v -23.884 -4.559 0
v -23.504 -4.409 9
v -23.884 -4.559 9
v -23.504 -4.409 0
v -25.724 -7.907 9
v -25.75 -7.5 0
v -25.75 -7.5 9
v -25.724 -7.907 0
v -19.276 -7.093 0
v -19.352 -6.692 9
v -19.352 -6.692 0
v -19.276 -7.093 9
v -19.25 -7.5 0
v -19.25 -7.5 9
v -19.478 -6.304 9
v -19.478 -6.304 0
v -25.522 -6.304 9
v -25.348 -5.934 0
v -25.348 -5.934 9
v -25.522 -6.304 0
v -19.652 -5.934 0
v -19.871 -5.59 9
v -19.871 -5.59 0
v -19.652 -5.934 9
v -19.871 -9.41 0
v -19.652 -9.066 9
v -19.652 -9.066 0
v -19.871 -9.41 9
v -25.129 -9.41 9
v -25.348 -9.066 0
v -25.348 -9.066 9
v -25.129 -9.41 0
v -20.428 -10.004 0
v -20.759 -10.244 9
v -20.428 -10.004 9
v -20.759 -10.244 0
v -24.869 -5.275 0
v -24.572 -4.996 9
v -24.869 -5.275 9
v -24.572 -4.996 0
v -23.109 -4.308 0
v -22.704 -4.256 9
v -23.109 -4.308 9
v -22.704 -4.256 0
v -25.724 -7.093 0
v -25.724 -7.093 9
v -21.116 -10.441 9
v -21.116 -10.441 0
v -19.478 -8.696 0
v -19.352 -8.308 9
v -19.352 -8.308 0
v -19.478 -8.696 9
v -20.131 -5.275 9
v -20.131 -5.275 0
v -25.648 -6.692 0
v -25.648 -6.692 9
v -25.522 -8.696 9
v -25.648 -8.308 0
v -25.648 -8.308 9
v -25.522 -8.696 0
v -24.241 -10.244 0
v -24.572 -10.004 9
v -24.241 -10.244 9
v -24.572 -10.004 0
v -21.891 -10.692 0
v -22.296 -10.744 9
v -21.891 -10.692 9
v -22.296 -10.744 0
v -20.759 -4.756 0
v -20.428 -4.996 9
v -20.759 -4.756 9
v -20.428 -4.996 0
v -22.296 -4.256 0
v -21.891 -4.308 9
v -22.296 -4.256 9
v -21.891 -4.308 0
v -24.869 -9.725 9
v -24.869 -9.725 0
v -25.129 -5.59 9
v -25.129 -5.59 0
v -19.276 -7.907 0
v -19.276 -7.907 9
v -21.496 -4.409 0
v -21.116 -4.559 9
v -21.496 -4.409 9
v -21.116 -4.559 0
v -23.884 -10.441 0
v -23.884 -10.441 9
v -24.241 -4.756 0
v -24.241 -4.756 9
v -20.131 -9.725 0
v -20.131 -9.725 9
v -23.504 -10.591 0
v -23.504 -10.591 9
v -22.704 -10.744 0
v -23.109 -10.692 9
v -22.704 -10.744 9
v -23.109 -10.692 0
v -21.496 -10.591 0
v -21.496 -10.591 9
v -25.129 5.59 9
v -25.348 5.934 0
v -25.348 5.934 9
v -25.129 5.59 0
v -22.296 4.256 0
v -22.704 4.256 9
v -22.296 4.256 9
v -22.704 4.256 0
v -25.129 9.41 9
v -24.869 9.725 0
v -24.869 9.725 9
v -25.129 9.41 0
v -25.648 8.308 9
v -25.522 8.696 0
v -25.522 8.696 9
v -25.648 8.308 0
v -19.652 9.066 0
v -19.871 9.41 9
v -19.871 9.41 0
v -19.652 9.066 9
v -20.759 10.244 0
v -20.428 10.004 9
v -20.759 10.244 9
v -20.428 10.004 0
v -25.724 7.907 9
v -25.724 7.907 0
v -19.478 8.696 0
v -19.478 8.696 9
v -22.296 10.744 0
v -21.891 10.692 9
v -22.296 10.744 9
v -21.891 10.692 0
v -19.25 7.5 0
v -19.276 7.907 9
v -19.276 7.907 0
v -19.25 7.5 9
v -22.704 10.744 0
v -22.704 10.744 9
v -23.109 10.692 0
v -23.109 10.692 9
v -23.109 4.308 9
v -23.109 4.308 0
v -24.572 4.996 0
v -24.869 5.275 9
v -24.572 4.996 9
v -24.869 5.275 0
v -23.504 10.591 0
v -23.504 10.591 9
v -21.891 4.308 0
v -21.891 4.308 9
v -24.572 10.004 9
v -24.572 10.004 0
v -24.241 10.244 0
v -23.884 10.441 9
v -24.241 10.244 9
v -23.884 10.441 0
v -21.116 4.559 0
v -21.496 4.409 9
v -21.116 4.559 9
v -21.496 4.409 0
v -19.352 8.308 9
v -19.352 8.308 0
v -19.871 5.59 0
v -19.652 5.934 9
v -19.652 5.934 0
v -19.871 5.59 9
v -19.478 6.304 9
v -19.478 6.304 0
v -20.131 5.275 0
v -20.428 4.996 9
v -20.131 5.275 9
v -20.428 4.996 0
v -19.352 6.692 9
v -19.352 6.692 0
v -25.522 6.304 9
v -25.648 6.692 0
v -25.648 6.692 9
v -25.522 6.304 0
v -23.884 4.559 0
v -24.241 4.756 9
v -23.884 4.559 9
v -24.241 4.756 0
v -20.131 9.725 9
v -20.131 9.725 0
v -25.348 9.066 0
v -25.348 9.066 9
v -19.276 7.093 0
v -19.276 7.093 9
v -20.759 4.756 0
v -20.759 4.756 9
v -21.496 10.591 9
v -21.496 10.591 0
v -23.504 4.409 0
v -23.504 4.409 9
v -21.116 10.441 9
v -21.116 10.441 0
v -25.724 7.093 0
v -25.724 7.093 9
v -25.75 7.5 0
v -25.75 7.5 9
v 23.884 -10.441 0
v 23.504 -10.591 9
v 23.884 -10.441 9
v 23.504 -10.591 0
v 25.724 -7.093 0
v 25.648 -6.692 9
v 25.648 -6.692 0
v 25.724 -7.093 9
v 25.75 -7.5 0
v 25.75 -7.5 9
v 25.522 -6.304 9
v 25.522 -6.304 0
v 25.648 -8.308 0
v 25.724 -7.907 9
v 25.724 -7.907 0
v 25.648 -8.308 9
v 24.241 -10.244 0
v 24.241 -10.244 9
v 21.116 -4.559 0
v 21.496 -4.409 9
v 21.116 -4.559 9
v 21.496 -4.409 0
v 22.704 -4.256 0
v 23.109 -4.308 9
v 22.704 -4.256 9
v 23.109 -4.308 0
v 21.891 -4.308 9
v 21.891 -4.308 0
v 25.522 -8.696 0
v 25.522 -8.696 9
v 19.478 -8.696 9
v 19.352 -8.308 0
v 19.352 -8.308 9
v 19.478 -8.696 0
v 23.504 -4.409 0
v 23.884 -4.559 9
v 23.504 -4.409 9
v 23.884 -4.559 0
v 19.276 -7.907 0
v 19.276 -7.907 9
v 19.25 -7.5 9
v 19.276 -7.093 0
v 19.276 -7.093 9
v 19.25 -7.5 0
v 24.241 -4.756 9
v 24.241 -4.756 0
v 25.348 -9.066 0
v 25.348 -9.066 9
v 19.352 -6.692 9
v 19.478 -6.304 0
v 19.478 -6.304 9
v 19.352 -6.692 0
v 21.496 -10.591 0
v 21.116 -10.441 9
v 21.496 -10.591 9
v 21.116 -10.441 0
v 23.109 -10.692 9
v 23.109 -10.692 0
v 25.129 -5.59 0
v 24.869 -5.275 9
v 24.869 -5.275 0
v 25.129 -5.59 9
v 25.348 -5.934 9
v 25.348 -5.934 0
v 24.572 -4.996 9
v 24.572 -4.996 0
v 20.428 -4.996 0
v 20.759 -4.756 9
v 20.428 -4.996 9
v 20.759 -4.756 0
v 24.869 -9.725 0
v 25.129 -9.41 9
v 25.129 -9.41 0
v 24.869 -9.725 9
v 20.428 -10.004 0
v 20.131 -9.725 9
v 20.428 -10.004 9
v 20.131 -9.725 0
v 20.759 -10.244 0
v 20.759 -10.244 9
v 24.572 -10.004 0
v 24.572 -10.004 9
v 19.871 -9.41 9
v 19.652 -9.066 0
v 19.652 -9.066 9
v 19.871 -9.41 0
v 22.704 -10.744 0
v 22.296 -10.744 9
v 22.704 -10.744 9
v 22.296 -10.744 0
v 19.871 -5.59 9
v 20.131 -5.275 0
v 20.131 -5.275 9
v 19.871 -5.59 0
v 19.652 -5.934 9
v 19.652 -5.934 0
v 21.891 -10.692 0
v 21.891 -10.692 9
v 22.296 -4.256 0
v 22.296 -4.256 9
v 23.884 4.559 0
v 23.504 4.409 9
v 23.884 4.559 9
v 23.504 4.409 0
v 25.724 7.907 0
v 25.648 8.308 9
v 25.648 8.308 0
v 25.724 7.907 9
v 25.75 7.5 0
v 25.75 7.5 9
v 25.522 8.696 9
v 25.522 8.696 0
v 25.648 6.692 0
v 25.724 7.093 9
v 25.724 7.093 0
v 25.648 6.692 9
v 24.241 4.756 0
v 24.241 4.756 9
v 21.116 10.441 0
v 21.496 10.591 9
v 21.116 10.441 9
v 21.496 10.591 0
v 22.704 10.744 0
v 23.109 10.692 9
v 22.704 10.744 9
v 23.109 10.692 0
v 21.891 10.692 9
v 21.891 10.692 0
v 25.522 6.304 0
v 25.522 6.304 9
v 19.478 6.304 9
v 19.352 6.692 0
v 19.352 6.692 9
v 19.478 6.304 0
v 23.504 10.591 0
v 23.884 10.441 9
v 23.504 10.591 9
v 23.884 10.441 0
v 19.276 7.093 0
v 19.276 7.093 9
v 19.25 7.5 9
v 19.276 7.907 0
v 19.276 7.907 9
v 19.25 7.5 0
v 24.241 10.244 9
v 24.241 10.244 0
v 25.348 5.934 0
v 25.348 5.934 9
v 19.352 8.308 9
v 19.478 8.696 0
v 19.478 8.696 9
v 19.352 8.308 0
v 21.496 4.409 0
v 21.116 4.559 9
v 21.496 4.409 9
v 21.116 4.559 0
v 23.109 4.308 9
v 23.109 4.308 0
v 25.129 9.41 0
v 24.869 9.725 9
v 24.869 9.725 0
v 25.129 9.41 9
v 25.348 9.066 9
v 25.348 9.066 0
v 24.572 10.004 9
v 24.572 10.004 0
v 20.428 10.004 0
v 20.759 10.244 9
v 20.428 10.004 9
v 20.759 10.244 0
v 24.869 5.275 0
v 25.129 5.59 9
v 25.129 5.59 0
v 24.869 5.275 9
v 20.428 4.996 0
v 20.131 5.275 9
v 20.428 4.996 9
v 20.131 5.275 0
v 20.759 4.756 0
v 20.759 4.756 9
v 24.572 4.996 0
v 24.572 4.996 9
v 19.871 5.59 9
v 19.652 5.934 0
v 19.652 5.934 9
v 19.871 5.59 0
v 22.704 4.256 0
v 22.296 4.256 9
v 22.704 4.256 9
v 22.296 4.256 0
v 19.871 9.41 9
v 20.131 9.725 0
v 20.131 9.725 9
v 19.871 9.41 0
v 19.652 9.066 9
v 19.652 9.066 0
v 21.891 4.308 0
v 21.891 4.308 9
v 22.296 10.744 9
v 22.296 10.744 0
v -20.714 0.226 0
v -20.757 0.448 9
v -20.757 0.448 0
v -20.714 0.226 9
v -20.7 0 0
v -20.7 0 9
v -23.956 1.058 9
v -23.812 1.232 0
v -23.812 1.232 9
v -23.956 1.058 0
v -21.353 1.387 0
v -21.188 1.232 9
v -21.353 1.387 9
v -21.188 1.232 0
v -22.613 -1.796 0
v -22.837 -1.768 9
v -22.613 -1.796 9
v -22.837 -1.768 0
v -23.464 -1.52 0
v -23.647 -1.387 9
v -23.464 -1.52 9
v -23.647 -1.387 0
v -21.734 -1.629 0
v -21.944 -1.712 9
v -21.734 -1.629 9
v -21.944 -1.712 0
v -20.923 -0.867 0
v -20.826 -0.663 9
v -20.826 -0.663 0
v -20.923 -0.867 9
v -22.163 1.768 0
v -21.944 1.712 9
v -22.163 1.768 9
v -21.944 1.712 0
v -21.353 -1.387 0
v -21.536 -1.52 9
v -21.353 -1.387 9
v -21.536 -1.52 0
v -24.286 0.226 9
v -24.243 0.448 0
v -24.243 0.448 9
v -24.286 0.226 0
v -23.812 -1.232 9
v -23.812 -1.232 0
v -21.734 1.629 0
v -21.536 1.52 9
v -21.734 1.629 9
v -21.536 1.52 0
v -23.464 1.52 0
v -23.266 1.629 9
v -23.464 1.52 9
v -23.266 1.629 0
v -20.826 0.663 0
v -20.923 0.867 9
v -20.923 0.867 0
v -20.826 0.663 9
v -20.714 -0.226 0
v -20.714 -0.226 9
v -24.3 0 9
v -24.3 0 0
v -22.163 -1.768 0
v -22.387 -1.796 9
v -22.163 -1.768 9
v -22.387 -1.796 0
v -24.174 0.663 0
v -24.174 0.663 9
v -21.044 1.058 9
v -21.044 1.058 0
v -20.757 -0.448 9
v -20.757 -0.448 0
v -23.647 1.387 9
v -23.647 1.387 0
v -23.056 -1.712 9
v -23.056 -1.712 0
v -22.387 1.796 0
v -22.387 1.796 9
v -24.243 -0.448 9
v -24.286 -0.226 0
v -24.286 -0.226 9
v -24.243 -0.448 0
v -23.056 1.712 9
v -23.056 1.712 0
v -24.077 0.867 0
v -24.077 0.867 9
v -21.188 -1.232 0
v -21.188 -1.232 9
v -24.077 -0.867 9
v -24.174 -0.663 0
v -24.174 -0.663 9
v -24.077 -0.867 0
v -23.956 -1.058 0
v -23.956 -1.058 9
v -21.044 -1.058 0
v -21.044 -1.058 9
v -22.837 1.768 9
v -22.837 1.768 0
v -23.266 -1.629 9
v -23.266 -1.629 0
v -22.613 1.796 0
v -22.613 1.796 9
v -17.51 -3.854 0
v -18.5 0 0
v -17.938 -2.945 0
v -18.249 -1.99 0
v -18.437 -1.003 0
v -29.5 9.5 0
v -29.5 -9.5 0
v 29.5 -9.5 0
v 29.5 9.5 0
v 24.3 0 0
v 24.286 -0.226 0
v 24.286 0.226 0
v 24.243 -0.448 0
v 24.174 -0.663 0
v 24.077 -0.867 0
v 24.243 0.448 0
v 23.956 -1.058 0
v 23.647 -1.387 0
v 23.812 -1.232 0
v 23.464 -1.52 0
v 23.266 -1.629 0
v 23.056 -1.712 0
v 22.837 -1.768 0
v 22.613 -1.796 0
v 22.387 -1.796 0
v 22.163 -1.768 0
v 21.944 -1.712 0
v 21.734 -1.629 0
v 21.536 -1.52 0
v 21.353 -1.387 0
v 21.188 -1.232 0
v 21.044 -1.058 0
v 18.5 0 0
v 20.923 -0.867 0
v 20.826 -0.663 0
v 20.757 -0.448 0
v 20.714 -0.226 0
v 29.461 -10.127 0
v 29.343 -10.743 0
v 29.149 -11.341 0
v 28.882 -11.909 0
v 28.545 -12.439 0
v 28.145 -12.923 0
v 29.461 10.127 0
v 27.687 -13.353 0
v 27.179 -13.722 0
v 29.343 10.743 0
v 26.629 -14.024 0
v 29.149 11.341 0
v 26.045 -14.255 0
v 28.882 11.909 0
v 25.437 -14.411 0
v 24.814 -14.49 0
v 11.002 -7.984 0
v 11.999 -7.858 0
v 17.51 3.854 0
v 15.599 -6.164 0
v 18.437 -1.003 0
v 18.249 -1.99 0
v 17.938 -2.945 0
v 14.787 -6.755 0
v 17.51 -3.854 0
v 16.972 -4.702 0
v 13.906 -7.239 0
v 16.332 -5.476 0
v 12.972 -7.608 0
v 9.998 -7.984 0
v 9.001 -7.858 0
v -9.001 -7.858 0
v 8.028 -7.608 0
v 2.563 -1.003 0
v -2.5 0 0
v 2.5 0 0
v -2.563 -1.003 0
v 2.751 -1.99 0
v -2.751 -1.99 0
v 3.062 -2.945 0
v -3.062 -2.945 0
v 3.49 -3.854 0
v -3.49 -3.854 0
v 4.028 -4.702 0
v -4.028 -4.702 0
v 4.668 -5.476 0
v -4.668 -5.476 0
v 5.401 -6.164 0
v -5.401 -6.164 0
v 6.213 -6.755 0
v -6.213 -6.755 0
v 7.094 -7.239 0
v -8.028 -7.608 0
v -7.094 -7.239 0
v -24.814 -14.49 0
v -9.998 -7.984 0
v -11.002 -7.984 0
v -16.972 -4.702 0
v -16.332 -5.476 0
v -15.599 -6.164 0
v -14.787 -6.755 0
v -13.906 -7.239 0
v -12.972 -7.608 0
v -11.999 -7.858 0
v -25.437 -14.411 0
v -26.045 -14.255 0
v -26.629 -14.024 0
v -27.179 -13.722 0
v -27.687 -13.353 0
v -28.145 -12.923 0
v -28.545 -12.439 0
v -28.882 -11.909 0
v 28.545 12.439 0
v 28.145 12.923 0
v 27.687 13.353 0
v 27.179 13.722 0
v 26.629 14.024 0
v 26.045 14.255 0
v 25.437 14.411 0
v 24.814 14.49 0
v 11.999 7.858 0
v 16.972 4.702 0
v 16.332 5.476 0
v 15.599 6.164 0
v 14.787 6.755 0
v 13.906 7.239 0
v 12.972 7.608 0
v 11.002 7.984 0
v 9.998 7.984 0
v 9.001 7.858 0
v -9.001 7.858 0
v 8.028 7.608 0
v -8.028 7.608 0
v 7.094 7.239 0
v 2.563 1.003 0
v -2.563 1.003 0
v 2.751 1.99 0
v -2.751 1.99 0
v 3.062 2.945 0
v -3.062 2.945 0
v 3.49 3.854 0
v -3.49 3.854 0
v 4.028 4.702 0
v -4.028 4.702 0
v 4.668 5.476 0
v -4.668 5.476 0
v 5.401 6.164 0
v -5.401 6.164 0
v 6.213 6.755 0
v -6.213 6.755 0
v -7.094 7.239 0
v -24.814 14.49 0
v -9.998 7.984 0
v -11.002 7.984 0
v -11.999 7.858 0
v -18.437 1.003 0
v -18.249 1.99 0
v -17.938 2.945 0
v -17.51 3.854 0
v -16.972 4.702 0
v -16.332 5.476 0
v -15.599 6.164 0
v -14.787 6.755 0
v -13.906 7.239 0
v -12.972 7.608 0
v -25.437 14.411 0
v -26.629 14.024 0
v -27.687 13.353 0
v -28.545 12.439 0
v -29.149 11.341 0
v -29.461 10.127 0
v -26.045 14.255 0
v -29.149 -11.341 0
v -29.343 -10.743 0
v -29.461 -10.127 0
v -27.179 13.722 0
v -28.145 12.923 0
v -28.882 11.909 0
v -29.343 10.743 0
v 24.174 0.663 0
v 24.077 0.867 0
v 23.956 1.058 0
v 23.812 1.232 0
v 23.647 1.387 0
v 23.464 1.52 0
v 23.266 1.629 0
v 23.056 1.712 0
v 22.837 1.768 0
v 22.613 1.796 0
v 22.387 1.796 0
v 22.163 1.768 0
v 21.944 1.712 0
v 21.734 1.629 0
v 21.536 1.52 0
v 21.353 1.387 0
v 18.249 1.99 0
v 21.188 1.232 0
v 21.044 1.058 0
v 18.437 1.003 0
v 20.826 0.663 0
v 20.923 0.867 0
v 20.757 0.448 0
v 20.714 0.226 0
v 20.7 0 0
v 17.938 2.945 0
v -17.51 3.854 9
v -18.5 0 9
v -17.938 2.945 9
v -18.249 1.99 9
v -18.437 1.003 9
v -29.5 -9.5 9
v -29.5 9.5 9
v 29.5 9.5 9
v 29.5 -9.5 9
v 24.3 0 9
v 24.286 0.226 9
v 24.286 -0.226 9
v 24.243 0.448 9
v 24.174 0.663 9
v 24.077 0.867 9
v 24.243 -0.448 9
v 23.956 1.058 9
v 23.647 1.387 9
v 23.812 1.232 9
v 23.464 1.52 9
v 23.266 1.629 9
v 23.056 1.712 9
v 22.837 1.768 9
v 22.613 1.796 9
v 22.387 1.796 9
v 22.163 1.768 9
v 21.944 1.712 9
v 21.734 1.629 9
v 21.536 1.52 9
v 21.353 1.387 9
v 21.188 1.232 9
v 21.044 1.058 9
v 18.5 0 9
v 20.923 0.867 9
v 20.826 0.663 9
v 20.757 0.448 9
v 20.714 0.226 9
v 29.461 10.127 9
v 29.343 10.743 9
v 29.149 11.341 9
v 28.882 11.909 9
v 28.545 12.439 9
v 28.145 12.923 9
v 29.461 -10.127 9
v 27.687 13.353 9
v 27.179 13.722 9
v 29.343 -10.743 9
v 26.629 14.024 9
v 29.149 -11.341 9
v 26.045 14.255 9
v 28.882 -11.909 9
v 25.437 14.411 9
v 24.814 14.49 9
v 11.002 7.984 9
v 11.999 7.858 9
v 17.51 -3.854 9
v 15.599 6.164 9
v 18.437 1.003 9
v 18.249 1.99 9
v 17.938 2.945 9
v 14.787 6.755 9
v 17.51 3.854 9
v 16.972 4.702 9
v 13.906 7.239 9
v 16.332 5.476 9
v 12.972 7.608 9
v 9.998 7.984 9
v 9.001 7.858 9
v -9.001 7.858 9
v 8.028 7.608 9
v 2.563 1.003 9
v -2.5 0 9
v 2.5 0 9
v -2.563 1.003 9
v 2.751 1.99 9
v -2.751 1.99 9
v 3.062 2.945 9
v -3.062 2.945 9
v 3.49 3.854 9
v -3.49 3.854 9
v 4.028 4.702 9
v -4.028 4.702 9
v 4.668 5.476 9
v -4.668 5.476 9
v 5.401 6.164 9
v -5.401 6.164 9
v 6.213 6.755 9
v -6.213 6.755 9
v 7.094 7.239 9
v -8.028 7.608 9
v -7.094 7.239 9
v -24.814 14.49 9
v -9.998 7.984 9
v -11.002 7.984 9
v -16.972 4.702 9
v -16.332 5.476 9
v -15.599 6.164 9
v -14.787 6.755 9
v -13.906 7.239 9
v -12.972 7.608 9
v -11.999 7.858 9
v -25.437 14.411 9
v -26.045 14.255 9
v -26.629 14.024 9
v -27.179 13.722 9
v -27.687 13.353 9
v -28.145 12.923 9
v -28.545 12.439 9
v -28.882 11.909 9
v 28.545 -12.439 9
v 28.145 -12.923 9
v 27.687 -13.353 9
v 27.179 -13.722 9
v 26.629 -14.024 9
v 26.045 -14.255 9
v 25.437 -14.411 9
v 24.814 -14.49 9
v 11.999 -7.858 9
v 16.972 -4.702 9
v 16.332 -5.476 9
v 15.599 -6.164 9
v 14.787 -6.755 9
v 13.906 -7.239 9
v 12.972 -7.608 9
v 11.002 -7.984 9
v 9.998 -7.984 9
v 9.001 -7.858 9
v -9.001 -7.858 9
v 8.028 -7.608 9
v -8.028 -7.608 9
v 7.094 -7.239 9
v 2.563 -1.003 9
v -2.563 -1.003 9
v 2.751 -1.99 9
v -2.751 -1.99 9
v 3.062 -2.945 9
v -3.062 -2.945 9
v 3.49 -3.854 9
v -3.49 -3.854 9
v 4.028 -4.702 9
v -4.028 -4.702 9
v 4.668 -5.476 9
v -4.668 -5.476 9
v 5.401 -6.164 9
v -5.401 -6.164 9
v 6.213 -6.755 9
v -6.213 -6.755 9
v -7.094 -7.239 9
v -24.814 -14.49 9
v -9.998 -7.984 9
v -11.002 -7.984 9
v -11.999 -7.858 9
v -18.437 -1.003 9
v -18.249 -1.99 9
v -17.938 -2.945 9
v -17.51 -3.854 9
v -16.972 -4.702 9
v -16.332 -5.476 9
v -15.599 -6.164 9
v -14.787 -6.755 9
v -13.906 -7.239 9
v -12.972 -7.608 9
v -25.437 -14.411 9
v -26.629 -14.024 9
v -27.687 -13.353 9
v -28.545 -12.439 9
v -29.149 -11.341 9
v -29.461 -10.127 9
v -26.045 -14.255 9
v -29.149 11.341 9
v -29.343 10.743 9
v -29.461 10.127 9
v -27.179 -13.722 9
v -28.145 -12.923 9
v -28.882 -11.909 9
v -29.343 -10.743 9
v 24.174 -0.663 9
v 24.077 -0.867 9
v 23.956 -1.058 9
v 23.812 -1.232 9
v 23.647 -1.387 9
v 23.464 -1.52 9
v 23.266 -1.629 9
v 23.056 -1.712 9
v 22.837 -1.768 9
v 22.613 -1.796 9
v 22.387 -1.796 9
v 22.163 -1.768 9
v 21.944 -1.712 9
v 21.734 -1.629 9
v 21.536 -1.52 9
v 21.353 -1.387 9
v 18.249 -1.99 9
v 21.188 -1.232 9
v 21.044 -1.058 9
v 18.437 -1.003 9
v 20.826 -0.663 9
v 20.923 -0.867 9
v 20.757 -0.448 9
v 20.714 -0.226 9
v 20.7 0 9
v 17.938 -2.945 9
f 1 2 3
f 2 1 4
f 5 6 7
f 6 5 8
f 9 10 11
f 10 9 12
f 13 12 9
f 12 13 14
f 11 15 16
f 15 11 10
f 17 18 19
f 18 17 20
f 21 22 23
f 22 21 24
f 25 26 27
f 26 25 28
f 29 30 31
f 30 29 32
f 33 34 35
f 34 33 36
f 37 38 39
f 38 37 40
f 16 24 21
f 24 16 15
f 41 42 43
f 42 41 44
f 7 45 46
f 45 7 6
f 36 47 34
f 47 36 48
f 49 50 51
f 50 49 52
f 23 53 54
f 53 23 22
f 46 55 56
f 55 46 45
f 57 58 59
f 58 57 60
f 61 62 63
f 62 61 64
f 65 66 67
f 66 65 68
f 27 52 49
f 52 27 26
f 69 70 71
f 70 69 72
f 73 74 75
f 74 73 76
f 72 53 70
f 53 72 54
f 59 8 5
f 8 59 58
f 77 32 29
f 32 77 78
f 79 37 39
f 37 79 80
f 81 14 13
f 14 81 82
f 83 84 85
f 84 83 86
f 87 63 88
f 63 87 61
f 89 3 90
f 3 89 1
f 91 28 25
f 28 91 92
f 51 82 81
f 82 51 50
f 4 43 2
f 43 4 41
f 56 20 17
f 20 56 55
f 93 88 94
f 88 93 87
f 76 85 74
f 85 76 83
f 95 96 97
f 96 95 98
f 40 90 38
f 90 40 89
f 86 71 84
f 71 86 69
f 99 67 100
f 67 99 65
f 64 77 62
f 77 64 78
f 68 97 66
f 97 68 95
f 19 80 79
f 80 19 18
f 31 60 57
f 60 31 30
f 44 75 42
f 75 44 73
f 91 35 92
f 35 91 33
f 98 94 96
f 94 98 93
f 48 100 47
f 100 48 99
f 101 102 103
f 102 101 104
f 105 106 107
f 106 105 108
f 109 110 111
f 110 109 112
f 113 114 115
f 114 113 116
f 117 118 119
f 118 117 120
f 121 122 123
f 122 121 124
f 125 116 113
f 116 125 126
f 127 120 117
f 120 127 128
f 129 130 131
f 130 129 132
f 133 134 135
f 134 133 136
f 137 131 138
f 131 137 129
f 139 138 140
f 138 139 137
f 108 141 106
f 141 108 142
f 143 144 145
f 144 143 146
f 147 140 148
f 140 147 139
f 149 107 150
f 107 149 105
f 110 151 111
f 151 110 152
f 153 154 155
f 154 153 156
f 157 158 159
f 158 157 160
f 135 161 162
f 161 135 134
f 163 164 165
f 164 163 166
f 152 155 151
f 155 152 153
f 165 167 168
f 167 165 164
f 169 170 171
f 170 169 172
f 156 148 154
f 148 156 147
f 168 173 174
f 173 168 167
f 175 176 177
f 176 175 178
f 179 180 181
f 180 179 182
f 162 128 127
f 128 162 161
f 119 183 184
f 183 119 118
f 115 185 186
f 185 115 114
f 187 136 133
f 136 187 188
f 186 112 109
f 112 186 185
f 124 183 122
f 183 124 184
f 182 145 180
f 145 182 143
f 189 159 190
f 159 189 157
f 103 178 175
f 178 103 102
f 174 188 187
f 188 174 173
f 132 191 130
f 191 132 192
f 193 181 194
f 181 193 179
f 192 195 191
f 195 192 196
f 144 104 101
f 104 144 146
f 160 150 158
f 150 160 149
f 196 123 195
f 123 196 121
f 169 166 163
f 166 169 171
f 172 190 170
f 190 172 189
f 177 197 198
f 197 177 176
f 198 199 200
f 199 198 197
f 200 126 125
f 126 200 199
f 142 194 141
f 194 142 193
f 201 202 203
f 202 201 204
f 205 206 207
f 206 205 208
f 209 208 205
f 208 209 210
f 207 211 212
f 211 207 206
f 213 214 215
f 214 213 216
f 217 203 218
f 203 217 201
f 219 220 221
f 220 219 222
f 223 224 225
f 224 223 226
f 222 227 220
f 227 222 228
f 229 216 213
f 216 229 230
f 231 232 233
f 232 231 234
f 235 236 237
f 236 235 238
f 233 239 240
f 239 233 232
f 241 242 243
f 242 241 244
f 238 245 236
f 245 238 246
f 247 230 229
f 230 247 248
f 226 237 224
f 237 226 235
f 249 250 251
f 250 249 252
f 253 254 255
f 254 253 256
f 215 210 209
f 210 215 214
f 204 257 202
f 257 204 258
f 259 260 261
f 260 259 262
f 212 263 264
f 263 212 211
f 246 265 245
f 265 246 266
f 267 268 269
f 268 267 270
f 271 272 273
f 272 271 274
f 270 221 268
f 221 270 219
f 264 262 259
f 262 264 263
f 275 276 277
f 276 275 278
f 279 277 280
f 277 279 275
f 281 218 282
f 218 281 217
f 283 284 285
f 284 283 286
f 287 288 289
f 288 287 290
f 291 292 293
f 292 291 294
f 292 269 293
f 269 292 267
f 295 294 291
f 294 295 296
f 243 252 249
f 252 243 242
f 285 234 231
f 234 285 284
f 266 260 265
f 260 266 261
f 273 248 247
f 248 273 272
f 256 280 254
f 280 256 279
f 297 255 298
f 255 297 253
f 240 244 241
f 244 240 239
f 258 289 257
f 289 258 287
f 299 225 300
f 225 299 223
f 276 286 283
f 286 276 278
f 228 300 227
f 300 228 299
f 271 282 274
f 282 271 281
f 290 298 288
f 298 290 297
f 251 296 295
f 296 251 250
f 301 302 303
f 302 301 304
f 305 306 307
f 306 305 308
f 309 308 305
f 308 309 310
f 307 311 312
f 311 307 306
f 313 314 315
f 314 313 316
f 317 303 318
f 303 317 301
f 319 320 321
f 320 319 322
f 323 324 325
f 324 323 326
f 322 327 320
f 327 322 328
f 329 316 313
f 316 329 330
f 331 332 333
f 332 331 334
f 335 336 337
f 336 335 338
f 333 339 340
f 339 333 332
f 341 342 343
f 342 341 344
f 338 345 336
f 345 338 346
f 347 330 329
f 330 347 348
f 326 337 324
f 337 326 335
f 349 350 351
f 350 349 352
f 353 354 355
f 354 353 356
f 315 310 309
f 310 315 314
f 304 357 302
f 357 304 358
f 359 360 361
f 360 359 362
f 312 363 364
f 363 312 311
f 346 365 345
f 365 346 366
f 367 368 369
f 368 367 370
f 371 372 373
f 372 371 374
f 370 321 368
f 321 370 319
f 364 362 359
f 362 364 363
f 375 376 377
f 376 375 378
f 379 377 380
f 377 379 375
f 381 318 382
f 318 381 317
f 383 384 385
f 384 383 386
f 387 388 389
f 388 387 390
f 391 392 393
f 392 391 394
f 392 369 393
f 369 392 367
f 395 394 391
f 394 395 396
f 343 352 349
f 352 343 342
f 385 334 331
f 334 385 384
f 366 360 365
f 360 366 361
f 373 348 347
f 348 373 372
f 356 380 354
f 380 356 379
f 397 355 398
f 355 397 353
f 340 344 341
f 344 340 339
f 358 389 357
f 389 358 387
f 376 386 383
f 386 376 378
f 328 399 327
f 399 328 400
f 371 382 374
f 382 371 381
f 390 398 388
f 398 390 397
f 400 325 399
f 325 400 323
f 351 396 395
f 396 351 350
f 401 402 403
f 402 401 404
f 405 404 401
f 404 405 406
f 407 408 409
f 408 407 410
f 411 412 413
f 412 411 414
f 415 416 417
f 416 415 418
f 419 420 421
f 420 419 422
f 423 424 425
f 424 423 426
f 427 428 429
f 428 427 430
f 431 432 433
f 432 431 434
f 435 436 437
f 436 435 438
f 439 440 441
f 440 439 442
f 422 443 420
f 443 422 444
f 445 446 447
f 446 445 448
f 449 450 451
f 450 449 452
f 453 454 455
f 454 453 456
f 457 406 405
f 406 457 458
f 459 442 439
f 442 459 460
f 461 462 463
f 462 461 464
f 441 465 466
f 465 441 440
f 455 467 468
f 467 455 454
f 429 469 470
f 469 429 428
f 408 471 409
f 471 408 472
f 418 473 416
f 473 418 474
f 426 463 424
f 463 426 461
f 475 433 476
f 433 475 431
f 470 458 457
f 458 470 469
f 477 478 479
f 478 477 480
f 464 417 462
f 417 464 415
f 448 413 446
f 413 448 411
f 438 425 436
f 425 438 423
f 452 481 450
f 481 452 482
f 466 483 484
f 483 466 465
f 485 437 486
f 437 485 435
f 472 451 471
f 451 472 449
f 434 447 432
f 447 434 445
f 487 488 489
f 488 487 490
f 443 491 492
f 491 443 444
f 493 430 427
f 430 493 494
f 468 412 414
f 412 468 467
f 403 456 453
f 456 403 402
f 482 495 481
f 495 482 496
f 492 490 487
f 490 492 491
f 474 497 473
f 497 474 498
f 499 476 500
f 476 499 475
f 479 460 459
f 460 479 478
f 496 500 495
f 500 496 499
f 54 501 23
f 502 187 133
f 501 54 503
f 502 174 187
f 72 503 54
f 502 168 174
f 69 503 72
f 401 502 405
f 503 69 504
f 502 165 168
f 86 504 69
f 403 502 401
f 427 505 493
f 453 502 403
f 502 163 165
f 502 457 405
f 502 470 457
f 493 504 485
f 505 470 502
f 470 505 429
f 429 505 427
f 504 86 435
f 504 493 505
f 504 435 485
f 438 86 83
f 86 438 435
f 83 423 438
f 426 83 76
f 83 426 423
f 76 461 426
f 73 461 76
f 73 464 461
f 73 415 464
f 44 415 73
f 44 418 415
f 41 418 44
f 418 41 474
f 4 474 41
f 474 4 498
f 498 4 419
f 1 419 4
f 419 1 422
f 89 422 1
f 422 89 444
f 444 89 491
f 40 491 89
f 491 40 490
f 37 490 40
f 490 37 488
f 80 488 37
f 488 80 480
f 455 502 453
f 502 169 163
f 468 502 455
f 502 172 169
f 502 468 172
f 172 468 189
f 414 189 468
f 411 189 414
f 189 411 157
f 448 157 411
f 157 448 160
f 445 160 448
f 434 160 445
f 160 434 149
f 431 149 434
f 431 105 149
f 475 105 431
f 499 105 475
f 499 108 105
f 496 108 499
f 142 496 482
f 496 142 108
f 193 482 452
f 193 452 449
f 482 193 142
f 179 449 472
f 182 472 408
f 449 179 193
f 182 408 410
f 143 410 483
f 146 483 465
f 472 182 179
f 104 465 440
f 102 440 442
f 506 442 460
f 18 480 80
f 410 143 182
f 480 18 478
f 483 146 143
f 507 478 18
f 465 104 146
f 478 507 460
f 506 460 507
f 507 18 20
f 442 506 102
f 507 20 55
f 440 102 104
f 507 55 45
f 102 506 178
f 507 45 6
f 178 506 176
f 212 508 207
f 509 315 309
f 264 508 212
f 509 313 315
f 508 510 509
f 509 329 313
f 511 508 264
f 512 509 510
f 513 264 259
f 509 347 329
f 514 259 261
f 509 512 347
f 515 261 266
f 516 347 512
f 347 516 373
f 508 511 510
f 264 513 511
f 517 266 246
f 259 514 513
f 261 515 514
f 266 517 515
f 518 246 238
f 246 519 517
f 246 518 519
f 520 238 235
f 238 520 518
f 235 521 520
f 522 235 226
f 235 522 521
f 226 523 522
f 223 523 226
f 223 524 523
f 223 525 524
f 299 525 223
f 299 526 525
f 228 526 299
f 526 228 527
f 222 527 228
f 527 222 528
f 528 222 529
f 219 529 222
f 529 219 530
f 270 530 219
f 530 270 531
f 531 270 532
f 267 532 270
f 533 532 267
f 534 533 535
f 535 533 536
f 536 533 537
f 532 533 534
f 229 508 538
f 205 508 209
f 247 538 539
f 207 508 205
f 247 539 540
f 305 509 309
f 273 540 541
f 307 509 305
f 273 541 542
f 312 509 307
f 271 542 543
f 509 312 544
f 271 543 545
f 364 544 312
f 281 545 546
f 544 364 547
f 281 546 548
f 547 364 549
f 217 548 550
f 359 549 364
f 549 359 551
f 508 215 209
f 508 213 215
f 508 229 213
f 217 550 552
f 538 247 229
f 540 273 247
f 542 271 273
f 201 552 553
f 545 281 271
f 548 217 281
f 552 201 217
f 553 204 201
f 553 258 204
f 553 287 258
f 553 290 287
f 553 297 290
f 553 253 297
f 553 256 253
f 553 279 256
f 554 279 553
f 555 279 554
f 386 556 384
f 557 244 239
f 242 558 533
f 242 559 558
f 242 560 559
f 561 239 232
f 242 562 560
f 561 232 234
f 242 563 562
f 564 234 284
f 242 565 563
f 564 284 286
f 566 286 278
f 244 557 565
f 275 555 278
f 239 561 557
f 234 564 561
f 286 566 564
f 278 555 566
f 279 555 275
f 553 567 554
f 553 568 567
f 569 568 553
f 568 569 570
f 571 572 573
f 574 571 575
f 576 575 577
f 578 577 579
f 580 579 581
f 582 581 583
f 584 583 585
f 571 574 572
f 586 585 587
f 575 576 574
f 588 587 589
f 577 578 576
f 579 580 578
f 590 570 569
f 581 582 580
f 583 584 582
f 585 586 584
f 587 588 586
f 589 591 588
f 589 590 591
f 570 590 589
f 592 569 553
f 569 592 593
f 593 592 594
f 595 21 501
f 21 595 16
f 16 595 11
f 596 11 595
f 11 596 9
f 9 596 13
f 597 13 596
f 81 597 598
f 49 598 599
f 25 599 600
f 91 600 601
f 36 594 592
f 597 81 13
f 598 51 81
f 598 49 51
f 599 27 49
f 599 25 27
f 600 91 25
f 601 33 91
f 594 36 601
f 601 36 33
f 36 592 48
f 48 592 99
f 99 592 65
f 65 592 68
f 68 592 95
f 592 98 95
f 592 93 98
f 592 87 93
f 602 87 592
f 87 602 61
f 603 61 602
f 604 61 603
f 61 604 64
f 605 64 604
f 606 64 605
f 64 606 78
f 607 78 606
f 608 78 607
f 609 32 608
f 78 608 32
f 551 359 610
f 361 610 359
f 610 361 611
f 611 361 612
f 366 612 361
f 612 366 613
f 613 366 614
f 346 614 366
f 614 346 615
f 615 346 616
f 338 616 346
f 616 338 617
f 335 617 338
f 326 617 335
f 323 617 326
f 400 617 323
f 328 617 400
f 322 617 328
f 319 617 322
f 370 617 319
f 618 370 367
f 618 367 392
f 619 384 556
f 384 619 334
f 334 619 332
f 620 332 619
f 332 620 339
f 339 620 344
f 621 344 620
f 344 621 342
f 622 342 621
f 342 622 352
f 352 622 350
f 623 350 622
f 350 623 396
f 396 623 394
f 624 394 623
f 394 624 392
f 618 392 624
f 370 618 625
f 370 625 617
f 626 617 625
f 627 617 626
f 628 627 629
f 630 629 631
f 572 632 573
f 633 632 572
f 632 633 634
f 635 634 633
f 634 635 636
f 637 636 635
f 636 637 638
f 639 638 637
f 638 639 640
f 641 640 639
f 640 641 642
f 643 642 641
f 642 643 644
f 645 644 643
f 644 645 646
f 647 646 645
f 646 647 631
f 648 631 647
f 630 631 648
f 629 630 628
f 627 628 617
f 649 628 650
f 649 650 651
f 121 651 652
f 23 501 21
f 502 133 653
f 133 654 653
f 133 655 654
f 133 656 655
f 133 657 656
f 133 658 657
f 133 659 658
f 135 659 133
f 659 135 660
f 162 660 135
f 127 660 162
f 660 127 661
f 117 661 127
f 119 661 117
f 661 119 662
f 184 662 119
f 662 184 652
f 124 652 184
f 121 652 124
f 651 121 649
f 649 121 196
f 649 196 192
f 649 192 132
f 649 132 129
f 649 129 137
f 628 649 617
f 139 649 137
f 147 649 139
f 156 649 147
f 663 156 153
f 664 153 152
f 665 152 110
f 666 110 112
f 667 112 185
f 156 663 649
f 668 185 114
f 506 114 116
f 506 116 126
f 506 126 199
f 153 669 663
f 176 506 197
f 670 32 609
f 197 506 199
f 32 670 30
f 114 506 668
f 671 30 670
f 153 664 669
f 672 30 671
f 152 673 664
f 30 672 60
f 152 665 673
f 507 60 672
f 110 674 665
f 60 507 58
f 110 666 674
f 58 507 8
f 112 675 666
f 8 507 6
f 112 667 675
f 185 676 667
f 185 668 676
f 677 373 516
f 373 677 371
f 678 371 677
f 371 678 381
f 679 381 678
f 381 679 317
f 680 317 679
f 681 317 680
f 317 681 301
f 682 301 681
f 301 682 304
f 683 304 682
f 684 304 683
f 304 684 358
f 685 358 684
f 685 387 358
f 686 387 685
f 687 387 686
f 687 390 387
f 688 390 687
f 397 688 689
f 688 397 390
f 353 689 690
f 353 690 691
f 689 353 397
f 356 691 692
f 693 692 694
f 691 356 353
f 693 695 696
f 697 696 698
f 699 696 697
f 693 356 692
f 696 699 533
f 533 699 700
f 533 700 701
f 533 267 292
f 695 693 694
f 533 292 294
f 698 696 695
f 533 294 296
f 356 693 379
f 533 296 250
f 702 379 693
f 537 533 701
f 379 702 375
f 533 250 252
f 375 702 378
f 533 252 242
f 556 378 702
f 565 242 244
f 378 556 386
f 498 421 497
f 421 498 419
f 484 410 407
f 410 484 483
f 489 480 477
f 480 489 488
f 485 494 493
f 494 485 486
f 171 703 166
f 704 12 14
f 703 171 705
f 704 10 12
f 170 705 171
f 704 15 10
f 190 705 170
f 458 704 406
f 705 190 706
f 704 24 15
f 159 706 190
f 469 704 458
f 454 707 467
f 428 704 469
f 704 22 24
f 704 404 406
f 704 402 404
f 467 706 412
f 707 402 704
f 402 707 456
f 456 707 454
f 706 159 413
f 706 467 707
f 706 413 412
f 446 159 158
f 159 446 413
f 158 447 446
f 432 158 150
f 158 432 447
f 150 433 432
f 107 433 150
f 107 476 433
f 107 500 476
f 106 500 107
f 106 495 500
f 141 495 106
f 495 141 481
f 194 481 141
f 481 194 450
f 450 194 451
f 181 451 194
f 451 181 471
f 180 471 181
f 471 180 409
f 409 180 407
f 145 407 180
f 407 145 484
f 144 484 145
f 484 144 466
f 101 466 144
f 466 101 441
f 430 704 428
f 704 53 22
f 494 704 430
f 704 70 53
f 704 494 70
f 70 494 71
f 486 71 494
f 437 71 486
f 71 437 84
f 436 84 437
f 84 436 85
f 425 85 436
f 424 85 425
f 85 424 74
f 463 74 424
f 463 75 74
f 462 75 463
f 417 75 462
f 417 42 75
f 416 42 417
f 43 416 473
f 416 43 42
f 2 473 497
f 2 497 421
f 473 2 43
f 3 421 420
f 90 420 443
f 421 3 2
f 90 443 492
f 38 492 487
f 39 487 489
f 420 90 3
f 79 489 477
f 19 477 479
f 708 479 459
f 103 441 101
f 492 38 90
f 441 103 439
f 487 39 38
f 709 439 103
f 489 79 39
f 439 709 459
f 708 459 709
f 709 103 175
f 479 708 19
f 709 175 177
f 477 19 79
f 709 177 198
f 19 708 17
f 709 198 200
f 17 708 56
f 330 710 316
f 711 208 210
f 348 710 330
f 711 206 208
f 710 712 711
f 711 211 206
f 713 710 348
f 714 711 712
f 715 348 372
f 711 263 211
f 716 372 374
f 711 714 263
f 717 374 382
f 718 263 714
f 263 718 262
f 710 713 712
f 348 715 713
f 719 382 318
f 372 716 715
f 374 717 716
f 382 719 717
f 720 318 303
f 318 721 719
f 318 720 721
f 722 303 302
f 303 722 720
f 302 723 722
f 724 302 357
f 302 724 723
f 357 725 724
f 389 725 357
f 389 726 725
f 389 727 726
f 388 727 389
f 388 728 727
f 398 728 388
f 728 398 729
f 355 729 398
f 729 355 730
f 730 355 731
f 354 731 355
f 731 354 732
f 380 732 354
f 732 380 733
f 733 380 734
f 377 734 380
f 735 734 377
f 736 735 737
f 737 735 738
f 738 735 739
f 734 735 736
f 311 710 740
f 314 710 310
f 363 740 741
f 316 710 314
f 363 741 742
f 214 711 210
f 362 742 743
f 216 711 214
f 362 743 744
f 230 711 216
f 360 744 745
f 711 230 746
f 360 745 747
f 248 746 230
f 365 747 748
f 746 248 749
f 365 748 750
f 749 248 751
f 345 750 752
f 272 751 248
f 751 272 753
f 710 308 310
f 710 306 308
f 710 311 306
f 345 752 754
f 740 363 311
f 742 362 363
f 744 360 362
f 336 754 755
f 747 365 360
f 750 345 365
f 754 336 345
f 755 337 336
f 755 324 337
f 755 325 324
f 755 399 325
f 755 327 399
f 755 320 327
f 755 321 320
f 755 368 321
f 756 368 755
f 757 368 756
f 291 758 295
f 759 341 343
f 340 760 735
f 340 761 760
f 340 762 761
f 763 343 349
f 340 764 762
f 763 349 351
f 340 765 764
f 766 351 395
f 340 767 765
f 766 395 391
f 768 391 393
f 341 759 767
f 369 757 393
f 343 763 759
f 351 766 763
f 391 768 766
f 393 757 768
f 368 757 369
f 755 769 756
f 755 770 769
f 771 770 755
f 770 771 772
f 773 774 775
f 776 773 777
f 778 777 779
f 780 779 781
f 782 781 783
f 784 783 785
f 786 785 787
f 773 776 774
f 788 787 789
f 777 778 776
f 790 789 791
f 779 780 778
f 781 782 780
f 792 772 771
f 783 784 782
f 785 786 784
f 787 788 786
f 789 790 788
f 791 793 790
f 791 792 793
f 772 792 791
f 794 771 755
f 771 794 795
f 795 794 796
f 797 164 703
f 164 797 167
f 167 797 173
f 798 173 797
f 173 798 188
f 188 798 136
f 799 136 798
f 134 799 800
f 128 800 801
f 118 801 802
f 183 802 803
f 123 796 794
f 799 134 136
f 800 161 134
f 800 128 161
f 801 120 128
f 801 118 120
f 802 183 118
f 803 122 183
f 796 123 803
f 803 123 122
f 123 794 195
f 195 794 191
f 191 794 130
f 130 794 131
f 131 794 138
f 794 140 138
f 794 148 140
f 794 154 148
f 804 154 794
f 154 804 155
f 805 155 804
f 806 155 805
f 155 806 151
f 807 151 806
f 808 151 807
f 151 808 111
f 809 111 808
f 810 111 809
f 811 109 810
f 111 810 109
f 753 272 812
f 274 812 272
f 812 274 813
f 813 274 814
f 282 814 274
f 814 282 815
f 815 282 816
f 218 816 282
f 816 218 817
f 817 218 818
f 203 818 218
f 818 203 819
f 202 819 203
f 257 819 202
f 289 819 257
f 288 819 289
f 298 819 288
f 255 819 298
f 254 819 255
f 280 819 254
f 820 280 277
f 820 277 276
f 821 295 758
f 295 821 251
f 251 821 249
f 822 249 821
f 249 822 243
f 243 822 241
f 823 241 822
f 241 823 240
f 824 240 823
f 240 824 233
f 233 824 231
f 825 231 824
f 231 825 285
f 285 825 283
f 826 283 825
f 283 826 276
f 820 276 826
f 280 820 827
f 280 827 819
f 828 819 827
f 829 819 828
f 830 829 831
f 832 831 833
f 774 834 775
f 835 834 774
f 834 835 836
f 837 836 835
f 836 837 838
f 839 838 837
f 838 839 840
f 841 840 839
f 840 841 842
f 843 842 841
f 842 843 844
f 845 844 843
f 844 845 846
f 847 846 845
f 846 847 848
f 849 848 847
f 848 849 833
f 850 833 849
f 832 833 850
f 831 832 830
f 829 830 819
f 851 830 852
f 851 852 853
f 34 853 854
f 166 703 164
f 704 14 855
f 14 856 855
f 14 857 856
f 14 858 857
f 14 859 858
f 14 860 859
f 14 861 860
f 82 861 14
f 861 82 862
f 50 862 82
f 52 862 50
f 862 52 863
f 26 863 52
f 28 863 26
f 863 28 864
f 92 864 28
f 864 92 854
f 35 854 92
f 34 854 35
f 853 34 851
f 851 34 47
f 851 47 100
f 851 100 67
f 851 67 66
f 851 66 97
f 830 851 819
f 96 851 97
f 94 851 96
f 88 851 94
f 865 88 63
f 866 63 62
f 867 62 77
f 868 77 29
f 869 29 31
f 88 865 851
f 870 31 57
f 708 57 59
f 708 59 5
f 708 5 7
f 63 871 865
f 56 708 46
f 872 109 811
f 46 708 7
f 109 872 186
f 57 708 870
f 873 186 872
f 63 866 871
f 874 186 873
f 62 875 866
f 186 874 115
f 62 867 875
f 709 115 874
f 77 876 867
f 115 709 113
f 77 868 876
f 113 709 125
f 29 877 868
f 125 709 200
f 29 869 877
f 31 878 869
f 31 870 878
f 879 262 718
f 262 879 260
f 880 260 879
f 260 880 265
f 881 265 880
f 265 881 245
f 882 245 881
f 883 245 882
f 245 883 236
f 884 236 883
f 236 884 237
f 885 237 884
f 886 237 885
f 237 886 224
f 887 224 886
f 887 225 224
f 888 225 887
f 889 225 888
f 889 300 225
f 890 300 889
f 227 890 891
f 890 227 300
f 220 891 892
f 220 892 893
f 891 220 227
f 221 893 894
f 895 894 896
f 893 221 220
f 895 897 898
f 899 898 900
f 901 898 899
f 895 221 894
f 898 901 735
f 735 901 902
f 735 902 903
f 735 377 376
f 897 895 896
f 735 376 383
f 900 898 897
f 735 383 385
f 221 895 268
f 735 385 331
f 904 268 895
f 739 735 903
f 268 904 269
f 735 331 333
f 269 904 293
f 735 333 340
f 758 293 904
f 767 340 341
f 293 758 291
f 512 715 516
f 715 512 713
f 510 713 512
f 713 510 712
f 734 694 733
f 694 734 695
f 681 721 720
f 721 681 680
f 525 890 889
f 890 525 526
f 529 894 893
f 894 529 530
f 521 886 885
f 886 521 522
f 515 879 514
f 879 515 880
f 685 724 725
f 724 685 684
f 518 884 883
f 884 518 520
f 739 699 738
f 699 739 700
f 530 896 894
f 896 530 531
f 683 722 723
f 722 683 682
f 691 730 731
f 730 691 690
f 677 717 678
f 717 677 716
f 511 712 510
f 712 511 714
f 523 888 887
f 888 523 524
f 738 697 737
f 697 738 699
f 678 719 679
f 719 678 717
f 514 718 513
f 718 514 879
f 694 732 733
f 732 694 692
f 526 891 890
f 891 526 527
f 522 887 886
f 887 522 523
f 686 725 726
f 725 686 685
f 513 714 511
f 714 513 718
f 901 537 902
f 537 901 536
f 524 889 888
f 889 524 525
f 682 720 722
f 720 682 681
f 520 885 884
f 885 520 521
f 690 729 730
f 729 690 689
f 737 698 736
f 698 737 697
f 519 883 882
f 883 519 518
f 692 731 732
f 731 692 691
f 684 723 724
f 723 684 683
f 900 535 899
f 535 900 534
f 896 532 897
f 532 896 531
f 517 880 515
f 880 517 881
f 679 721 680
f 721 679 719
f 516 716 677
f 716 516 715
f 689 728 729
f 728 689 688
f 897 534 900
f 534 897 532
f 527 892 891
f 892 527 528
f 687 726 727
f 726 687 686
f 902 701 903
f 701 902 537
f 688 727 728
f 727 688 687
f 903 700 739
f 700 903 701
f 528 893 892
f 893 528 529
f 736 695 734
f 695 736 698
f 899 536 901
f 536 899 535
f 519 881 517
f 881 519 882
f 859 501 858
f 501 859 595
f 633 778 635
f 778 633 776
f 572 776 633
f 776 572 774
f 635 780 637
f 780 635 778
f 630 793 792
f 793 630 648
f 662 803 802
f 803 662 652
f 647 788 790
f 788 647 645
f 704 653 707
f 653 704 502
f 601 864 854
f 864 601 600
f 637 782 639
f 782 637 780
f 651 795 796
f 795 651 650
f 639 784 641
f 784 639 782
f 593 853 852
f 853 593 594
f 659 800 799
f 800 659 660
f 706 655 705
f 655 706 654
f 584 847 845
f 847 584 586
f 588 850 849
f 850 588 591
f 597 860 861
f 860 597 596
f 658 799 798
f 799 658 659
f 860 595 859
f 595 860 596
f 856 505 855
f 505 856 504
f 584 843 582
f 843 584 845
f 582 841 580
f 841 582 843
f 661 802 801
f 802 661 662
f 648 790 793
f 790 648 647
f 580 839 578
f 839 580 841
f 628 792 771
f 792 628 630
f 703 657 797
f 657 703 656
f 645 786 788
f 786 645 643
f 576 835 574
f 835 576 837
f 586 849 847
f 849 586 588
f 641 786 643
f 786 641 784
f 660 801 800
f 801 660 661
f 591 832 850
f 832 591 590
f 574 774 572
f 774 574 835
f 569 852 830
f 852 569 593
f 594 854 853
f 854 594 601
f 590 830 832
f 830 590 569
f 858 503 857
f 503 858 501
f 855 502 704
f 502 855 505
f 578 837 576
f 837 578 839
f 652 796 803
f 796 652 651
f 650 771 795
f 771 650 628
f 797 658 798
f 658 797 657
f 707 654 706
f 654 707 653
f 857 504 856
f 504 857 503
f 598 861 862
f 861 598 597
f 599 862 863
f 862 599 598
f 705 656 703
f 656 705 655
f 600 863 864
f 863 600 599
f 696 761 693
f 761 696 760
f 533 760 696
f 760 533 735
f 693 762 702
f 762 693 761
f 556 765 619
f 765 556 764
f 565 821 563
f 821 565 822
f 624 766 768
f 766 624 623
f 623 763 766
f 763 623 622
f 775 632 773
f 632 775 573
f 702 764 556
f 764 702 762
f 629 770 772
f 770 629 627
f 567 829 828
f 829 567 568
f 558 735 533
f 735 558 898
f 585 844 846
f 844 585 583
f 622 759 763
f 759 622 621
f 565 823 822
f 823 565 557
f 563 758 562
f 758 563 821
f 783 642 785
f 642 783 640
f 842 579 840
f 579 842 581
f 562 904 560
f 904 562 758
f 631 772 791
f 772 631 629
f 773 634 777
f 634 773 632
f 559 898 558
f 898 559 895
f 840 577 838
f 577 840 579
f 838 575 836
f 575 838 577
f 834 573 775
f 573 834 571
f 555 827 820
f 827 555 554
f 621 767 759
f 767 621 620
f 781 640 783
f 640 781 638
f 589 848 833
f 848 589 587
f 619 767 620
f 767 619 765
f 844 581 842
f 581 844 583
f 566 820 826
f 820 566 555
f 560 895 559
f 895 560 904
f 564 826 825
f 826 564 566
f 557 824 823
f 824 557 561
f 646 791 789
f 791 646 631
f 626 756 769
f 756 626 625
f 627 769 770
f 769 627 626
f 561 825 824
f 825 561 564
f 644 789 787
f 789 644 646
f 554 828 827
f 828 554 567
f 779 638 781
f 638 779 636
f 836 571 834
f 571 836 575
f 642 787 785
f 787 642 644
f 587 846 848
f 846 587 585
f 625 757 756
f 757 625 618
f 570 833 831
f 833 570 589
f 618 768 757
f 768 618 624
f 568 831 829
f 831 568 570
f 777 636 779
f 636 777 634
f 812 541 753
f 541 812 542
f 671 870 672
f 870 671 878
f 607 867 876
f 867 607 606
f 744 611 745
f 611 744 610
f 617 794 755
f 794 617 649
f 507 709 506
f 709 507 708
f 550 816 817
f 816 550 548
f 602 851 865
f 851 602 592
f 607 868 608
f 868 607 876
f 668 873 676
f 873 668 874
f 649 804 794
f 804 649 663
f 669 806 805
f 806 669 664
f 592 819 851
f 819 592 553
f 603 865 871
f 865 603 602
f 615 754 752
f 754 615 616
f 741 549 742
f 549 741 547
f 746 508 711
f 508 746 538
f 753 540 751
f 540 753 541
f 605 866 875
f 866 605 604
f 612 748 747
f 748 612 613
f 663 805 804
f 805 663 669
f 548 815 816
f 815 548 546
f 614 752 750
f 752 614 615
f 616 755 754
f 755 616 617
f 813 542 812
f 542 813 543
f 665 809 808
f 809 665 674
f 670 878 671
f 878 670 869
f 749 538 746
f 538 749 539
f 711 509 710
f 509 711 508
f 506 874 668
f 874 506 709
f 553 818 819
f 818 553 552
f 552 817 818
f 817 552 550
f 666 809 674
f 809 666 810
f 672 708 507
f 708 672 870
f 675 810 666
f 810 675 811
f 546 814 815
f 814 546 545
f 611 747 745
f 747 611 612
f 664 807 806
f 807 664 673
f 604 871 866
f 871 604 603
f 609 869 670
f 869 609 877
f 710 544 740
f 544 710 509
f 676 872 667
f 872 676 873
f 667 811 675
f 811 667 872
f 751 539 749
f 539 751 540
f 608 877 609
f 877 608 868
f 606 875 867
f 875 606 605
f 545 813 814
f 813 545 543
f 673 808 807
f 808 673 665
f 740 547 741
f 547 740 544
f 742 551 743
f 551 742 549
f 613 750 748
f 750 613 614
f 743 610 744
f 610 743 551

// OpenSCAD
$fn = 50;


difference() {
	union() {
		hull() {
			translate(v = [-24.5000000000, 9.5000000000, 0]) {
				cylinder(h = 9, r = 5);
			}
			translate(v = [24.5000000000, 9.5000000000, 0]) {
				cylinder(h = 9, r = 5);
			}
			translate(v = [-24.5000000000, -9.5000000000, 0]) {
				cylinder(h = 9, r = 5);
			}
			translate(v = [24.5000000000, -9.5000000000, 0]) {
				cylinder(h = 9, r = 5);
			}
		}
	}
	union() {
		#translate(v = [-22.5000000000, -7.5000000000, 0]) {
			cylinder(h = 9, r = 3.2500000000);
		}
		#translate(v = [-22.5000000000, 7.5000000000, 0]) {
			cylinder(h = 9, r = 3.2500000000);
		}
		#translate(v = [22.5000000000, -7.5000000000, 0]) {
			cylinder(h = 9, r = 3.2500000000);
		}
		#translate(v = [22.5000000000, 7.5000000000, 0]) {
			cylinder(h = 9, r = 3.2500000000);
		}
		#translate(v = [-22.5000000000, -7.5000000000, -100.0000000000]) {
			cylinder(h = 200, r = 3.2500000000);
		}
		#translate(v = [-22.5000000000, 7.5000000000, -100.0000000000]) {
			cylinder(h = 200, r = 3.2500000000);
		}
		#translate(v = [22.5000000000, -7.5000000000, -100.0000000000]) {
			cylinder(h = 200, r = 3.2500000000);
		}
		#translate(v = [22.5000000000, 7.5000000000, -100.0000000000]) {
			cylinder(h = 200, r = 3.2500000000);
		}
		#translate(v = [-22.5000000000, -7.5000000000, 0]) {
			cylinder(h = 9, r = 1.8000000000);
		}
		#translate(v = [-22.5000000000, 0.0000000000, 0]) {
			cylinder(h = 9, r = 1.8000000000);
		}
		#translate(v = [-22.5000000000, 7.5000000000, 0]) {
			cylinder(h = 9, r = 1.8000000000);
		}
		#translate(v = [22.5000000000, -7.5000000000, 0]) {
			cylinder(h = 9, r = 1.8000000000);
		}
		#translate(v = [22.5000000000, 0.0000000000, 0]) {
			cylinder(h = 9, r = 1.8000000000);
		}
		#translate(v = [22.5000000000, 7.5000000000, 0]) {
			cylinder(h = 9, r = 1.8000000000);
		}
		#translate(v = [-22.5000000000, -7.5000000000, 0]) {
			cylinder(h = 9, r = 1.8000000000);
		}
		#translate(v = [-22.5000000000, 0.0000000000, 0]) {
			cylinder(h = 9, r = 1.8000000000);
		}
		#translate(v = [-22.5000000000, 7.5000000000, 0]) {
			cylinder(h = 9, r = 1.8000000000);
		}
		#translate(v = [22.5000000000, -7.5000000000, 0]) {
			cylinder(h = 9, r = 1.8000000000);
		}
		#translate(v = [22.5000000000, 0.0000000000, 0]) {
			cylinder(h = 9, r = 1.8000000000);
		}
		#translate(v = [22.5000000000, 7.5000000000, 0]) {
			cylinder(h = 9, r = 1.8000000000);
		}
		#translate(v = [-22.5000000000, -7.5000000000, 0]) {
			cylinder(h = 9, r = 1.8000000000);
		}
		#translate(v = [-22.5000000000, 0.0000000000, 0]) {
			cylinder(h = 9, r = 1.8000000000);
		}
		#translate(v = [-22.5000000000, 7.5000000000, 0]) {
			cylinder(h = 9, r = 1.8000000000);
		}
		#translate(v = [22.5000000000, -7.5000000000, 0]) {
			cylinder(h = 9, r = 1.8000000000);
		}
		#translate(v = [22.5000000000, 0.0000000000, 0]) {
			cylinder(h = 9, r = 1.8000000000);
		}
		#translate(v = [22.5000000000, 7.5000000000, 0]) {
			cylinder(h = 9, r = 1.8000000000);
		}
		#translate(v = [-10.5000000000, 0, 0]) {
			cylinder(h = 9, r = 8.0000000000);
		}
		#translate(v = [10.5000000000, 0, 0]) {
			cylinder(h = 9, r = 8.0000000000);
		}
	}
}
